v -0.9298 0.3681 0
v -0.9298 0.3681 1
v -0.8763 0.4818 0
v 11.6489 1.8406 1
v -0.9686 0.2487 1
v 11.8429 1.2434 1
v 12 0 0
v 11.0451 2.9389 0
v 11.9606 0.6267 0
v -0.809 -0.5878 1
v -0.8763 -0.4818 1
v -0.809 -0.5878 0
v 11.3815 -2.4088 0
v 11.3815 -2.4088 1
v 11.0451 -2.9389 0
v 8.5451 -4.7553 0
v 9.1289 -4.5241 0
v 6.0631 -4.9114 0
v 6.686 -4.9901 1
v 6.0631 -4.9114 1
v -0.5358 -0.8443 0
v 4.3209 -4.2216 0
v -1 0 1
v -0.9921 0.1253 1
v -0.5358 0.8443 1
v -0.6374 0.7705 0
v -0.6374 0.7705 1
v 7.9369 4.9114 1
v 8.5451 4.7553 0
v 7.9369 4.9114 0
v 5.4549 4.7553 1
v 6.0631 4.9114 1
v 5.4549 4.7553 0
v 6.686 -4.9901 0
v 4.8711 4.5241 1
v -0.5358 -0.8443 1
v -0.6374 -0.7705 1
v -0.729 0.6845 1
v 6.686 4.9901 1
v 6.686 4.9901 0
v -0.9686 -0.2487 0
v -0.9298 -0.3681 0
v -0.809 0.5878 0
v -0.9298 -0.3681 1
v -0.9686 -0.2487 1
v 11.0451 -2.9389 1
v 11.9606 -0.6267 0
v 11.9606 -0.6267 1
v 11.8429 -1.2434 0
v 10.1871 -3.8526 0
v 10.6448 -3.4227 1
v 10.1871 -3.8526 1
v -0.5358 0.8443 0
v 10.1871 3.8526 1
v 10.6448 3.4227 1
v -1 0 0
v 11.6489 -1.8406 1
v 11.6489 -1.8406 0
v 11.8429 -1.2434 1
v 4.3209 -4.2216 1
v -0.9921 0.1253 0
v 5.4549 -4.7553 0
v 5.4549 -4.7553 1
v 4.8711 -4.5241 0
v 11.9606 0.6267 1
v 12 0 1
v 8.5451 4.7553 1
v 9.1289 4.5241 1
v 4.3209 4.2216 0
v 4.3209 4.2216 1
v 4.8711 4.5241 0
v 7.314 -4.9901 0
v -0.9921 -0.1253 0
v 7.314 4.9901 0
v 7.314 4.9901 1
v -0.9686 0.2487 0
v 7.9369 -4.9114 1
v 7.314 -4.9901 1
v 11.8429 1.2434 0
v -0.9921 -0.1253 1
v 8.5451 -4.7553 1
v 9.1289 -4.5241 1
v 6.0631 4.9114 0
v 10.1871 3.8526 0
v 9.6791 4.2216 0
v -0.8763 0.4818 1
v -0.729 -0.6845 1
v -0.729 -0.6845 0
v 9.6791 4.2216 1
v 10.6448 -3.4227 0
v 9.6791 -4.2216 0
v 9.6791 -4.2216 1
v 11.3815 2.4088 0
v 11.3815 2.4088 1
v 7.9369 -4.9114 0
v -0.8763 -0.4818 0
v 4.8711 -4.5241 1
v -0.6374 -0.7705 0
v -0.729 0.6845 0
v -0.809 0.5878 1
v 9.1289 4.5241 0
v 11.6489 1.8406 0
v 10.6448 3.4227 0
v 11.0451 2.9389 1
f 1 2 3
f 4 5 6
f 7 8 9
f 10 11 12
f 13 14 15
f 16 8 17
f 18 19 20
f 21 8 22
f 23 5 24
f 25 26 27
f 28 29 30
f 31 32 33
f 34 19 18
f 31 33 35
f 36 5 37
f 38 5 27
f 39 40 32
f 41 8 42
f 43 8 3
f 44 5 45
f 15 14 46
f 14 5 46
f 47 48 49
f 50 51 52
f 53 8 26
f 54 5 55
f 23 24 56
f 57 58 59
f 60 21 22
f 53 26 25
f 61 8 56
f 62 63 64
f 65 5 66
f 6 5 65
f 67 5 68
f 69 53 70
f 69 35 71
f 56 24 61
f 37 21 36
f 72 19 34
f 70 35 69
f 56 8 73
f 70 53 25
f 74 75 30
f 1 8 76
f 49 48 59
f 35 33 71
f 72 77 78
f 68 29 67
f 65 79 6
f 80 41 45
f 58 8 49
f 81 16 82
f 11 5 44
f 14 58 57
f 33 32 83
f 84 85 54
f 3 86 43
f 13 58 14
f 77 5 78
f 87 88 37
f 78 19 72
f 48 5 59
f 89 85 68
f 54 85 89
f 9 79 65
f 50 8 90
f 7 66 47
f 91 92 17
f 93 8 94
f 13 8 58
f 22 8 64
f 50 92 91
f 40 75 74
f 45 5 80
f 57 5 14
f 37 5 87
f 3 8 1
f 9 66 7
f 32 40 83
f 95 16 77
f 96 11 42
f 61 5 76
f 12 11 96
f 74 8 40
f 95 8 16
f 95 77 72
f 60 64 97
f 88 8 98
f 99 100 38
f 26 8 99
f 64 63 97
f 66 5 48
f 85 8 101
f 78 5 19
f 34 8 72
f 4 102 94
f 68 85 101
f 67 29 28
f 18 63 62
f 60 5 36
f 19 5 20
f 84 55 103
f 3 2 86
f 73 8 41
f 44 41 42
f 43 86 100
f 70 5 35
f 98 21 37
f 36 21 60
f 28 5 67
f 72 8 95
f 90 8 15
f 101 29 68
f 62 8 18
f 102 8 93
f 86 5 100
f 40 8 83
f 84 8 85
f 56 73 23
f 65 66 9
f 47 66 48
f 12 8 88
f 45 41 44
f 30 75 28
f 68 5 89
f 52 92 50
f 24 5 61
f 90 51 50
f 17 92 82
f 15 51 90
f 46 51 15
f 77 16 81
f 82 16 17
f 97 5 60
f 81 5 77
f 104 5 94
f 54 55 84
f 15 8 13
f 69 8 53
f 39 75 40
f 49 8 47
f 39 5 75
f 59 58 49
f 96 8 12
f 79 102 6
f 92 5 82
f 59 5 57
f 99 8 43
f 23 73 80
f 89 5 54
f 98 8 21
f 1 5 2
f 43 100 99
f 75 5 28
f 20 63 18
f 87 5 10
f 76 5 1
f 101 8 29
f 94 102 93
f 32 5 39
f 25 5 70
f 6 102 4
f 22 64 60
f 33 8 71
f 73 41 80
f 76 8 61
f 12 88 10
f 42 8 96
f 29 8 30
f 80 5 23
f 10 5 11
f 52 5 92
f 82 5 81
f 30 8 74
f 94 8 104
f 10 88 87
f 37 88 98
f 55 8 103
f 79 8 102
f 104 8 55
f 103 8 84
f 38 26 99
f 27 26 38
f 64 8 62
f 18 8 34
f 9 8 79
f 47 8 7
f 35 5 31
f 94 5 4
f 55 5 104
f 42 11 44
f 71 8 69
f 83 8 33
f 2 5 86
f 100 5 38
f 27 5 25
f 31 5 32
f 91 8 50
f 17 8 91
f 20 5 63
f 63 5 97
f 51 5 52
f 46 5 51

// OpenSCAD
// Transforming Shapes - Design Time: Guitar Pick

$fn = 50;

hull() {
    cylinder(h=1, r1=1, r2=1);
    translate([7, 0, 0]) cylinder(h=1, r1=5, r2=5);
}
